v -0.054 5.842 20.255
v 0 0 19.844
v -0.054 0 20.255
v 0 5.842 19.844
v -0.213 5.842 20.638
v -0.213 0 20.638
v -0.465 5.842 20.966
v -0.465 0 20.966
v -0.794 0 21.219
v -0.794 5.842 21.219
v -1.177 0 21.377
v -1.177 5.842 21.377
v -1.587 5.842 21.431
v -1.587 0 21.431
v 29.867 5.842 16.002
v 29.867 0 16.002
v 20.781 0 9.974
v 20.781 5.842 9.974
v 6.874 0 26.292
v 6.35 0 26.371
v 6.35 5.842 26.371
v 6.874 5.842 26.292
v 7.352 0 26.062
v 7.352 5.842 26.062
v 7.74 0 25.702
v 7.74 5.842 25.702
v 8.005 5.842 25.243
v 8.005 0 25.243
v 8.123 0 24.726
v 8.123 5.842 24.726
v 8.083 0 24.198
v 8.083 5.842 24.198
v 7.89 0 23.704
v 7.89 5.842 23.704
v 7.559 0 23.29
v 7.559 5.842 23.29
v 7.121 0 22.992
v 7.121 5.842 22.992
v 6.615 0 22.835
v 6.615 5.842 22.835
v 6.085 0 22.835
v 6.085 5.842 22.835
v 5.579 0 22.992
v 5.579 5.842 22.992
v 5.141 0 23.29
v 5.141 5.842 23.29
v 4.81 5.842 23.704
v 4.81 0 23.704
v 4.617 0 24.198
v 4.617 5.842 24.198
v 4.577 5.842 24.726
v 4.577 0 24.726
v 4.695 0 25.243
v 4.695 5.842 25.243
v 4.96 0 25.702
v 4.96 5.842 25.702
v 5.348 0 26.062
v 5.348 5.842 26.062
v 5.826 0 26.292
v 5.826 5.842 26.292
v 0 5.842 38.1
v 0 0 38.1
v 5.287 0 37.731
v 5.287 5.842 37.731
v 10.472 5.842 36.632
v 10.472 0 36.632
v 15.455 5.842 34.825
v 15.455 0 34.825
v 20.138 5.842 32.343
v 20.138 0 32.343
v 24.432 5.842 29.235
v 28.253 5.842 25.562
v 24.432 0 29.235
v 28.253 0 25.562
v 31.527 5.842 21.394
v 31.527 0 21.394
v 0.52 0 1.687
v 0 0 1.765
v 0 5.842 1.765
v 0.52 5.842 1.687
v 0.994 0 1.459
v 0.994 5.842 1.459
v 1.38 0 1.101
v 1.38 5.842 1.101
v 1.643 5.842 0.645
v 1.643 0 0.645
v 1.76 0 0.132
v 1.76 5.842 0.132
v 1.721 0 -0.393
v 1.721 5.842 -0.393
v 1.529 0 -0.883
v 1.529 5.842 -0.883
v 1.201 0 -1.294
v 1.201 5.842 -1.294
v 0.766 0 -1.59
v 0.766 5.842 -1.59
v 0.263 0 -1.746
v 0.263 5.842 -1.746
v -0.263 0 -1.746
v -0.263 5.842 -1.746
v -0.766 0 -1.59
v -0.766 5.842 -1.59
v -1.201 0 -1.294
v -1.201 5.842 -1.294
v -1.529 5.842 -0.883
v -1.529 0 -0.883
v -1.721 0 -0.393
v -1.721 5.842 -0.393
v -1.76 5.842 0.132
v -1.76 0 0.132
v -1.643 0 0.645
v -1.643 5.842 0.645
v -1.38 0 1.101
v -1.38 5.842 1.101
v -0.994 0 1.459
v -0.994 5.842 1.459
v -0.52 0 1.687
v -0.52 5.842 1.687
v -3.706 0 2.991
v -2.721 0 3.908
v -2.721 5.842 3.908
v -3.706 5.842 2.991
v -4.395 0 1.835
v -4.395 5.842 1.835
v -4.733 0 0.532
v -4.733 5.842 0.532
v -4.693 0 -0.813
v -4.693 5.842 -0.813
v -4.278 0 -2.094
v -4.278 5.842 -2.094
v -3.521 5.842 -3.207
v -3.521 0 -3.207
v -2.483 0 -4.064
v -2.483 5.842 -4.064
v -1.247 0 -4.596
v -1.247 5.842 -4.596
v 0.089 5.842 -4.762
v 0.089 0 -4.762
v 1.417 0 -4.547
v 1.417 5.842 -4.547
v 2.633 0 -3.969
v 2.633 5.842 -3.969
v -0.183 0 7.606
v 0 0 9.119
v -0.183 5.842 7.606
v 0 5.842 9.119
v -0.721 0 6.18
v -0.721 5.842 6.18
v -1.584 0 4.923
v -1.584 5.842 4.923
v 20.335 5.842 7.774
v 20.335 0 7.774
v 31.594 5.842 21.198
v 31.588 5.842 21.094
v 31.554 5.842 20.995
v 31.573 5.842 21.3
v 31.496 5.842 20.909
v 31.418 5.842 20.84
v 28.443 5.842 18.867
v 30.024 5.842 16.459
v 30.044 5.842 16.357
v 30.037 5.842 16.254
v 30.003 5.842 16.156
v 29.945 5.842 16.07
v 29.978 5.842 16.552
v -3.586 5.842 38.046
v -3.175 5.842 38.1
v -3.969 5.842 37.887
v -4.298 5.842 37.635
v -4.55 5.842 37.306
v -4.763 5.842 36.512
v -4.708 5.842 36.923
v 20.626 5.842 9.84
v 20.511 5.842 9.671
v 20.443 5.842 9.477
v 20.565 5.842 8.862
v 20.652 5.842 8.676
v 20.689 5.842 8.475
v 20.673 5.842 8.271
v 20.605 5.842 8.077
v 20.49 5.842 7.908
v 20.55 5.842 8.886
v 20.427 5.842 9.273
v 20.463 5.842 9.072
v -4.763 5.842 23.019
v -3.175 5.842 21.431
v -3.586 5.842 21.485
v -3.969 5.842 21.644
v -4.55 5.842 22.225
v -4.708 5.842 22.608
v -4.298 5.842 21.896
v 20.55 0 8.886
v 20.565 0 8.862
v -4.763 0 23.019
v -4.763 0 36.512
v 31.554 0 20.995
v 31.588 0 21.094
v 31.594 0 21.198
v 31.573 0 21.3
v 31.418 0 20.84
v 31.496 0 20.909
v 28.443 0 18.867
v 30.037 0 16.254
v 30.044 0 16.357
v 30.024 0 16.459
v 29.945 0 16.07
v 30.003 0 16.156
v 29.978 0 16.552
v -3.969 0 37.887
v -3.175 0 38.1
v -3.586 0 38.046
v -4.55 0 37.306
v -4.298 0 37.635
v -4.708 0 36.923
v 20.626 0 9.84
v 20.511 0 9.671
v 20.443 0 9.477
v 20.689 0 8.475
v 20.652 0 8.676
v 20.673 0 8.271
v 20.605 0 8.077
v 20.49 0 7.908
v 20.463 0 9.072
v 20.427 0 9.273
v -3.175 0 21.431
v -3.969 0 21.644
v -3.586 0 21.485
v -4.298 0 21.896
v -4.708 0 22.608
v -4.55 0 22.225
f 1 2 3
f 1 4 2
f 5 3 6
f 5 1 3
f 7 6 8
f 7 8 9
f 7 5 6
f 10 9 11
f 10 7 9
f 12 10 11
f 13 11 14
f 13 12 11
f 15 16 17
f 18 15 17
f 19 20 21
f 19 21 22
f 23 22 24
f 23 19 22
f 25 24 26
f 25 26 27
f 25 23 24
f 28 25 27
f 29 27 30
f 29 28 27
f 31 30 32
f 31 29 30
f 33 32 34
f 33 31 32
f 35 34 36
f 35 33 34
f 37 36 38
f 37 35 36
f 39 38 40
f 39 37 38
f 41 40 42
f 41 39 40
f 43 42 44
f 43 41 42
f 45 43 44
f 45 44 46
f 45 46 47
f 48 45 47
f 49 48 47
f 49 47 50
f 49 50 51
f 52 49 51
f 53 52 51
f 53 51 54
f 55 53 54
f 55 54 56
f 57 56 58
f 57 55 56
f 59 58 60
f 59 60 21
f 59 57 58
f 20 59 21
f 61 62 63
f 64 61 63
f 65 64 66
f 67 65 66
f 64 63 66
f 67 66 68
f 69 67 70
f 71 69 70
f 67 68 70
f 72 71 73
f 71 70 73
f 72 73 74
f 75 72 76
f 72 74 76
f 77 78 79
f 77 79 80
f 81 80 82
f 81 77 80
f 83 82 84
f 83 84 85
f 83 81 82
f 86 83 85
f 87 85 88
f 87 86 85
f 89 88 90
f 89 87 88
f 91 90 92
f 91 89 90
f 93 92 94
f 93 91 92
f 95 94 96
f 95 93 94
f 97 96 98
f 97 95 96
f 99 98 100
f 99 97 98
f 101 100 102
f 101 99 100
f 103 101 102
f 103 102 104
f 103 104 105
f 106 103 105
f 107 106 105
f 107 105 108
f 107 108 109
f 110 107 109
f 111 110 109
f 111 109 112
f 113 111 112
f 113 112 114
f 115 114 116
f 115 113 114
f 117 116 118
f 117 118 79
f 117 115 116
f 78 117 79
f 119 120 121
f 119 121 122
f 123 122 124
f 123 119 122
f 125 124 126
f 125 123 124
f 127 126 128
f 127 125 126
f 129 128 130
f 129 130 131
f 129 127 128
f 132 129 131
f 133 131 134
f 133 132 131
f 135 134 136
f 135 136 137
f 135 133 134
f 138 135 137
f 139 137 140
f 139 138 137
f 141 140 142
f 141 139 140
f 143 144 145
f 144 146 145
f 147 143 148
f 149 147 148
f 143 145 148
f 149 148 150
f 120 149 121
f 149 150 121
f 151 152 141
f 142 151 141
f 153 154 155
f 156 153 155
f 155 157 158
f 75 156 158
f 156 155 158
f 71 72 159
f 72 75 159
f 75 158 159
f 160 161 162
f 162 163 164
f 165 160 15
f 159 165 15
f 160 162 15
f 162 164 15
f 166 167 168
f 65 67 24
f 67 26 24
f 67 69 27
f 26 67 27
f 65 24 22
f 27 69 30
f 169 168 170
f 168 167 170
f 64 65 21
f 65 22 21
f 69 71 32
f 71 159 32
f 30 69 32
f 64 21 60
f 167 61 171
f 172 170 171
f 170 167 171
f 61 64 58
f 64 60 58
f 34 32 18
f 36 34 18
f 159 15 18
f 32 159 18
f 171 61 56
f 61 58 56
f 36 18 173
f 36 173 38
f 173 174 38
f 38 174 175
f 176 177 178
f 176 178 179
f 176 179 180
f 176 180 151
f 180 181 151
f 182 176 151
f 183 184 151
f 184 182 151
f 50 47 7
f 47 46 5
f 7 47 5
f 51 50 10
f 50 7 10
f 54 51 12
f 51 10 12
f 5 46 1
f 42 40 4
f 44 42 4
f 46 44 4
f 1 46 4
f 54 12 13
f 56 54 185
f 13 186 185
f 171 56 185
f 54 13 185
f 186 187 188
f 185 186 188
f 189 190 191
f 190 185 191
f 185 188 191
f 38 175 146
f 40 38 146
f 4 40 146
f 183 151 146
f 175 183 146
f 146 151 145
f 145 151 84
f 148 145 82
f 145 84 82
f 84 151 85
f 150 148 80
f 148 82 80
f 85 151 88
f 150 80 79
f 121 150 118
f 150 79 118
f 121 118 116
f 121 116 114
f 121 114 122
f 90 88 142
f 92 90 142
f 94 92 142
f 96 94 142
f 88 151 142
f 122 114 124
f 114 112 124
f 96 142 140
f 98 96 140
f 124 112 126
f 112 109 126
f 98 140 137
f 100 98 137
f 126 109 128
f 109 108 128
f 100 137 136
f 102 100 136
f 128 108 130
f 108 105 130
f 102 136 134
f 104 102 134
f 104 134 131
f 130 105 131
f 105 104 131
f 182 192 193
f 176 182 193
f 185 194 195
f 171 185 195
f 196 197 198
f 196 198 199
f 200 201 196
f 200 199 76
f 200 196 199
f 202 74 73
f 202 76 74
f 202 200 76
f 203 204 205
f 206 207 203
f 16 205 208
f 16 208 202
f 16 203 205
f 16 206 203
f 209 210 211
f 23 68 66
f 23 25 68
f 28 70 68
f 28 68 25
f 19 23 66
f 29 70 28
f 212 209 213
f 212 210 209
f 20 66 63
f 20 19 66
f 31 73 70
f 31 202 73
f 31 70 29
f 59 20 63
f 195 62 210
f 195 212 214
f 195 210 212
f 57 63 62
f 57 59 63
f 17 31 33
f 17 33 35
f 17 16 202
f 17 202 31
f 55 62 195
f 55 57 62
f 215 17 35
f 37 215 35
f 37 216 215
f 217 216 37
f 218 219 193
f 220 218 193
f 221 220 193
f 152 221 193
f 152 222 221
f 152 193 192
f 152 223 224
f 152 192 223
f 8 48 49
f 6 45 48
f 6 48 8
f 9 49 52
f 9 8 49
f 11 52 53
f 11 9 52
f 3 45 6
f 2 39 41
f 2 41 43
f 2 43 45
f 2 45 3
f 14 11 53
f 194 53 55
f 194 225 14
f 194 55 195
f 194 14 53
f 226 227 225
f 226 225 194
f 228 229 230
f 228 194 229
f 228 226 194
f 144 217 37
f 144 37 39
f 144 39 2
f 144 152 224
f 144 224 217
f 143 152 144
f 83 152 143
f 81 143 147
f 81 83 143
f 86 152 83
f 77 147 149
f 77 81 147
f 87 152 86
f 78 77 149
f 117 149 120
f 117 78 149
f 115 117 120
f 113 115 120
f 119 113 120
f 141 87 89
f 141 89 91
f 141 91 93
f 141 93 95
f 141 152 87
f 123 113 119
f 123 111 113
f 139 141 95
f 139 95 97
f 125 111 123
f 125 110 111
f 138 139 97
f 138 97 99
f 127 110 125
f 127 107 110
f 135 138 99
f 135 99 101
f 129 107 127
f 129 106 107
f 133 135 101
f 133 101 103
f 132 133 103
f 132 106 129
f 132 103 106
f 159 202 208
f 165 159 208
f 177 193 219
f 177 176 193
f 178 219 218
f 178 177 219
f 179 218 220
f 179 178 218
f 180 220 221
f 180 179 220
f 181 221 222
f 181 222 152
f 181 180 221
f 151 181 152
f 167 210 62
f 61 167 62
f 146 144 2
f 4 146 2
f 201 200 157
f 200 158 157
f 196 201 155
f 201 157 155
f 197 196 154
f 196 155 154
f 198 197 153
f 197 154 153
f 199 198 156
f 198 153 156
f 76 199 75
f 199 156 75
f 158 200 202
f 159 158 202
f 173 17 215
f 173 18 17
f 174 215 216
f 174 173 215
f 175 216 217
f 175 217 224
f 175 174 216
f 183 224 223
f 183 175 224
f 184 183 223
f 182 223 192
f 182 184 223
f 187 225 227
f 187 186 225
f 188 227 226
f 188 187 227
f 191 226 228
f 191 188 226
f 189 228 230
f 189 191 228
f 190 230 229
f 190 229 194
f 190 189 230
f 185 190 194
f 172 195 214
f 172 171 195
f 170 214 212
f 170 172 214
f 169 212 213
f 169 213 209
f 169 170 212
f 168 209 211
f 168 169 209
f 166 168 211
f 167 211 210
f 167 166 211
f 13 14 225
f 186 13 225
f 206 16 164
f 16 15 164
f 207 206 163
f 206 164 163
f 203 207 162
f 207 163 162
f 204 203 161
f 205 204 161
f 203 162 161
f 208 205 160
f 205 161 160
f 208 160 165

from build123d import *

# Parameters (mm, degrees)
SKETCH1_R           = 1.778
SKETCH1_R_2         = 1.7653
BOSS_EXTRUDE1_DEPTH = 5.842
FILLET3_R           = 1.5875
FILLET6_R           = 6.35
FILLET7_R           = 0.396875
FILLET9_R           = 0.79375


with BuildPart() as part:
    # Sketch1 → Boss-Extrude1 (new body)
    # profile 1 of 2: a face of its own
    with BuildSketch(Plane(origin=(0, 0, 0), x_dir=(1, 0, 0), z_dir=(0, 1, 0))):
        with BuildLine():
            ThreePointArc((4.7625, 0), (3.367596045, -3.367596045), (0, -4.7625))
            Line((0, -4.7625), (0, -21.43125))
            Line((0, -21.43125), (-4.7625, -21.43125))
            Line((-4.7625, -21.43125), (-4.7625, -38.1))
            Line((-4.7625, -38.1), (0, -38.1))
            ThreePointArc((0, -38.1), (18.016692001, -33.570951868), (31.75, -21.060567419))
            Line((31.75, -21.060567419), (28.442708333, -18.866758313))
            Line((28.442708333, -18.866758313), (30.197755618, -16.220924979))
            Line((30.197755618, -16.220924979), (20.130923816, -9.543344196))
            Line((20.130923816, -9.543344196), (20.98465671, -8.204646532))
            Line((20.98465671, -8.204646532), (2.632570927, 3.96875))
            ThreePointArc((2.632570927, 3.96875), (4.196368984, 2.2520865), (4.7625, 0))
        make_face()
        with Locations(Location((6.35, -24.593444248, 0), (0, 0, 270))):
            Circle(SKETCH1_R, mode=Mode.SUBTRACT)
    # profile 2 of 2: a face of its own
    with BuildSketch(Plane(origin=(0, 0, 0), x_dir=(1, 0, 0), z_dir=(0, 1, 0))):
        with BuildLine():
            ThreePointArc((4.7625, 0), (3.367596045, -3.367596045), (0, -4.7625))
            ThreePointArc((0, -4.7625), (-3.367596045, 3.367596045), (4.7625, 0))
        make_face()
        with Locations(Location((0, 0, 0), (0, 0, 270))):
            Circle(SKETCH1_R_2, mode=Mode.SUBTRACT)
    extrude(amount=BOSS_EXTRUDE1_DEPTH)

    # Fillet3
    fillet3_edges = [part.edges().sort_by_distance(p)[0] for p in [
        (-4.7625, 2.921, 38.1),
        (-4.7625, 2.921, 21.43125),
        (0, 2.921, 21.43125),
    ]]
    fillet(fillet3_edges, radius=FILLET3_R)

    # Fillet6
    fillet6_edges = [part.edges().sort_by_distance(p)[0] for p in [
        (0, 2.921, 4.7625),
    ]]
    fillet(fillet6_edges, radius=FILLET6_R)

    # Fillet7
    fillet7_edges = [part.edges().sort_by_distance(p)[0] for p in [
        (30.197755618, 2.921, 16.220924979),
        (31.75, 2.921, 21.060567419),
    ]]
    fillet(fillet7_edges, radius=FILLET7_R)

    # Fillet9
    fillet9_edges = [part.edges().sort_by_distance(p)[0] for p in [
        (20.98465671, 2.921, 8.204646532),
        (20.130923816, 2.921, 9.543344196),
    ]]
    fillet(fillet9_edges, radius=FILLET9_R)


solid = part.part
